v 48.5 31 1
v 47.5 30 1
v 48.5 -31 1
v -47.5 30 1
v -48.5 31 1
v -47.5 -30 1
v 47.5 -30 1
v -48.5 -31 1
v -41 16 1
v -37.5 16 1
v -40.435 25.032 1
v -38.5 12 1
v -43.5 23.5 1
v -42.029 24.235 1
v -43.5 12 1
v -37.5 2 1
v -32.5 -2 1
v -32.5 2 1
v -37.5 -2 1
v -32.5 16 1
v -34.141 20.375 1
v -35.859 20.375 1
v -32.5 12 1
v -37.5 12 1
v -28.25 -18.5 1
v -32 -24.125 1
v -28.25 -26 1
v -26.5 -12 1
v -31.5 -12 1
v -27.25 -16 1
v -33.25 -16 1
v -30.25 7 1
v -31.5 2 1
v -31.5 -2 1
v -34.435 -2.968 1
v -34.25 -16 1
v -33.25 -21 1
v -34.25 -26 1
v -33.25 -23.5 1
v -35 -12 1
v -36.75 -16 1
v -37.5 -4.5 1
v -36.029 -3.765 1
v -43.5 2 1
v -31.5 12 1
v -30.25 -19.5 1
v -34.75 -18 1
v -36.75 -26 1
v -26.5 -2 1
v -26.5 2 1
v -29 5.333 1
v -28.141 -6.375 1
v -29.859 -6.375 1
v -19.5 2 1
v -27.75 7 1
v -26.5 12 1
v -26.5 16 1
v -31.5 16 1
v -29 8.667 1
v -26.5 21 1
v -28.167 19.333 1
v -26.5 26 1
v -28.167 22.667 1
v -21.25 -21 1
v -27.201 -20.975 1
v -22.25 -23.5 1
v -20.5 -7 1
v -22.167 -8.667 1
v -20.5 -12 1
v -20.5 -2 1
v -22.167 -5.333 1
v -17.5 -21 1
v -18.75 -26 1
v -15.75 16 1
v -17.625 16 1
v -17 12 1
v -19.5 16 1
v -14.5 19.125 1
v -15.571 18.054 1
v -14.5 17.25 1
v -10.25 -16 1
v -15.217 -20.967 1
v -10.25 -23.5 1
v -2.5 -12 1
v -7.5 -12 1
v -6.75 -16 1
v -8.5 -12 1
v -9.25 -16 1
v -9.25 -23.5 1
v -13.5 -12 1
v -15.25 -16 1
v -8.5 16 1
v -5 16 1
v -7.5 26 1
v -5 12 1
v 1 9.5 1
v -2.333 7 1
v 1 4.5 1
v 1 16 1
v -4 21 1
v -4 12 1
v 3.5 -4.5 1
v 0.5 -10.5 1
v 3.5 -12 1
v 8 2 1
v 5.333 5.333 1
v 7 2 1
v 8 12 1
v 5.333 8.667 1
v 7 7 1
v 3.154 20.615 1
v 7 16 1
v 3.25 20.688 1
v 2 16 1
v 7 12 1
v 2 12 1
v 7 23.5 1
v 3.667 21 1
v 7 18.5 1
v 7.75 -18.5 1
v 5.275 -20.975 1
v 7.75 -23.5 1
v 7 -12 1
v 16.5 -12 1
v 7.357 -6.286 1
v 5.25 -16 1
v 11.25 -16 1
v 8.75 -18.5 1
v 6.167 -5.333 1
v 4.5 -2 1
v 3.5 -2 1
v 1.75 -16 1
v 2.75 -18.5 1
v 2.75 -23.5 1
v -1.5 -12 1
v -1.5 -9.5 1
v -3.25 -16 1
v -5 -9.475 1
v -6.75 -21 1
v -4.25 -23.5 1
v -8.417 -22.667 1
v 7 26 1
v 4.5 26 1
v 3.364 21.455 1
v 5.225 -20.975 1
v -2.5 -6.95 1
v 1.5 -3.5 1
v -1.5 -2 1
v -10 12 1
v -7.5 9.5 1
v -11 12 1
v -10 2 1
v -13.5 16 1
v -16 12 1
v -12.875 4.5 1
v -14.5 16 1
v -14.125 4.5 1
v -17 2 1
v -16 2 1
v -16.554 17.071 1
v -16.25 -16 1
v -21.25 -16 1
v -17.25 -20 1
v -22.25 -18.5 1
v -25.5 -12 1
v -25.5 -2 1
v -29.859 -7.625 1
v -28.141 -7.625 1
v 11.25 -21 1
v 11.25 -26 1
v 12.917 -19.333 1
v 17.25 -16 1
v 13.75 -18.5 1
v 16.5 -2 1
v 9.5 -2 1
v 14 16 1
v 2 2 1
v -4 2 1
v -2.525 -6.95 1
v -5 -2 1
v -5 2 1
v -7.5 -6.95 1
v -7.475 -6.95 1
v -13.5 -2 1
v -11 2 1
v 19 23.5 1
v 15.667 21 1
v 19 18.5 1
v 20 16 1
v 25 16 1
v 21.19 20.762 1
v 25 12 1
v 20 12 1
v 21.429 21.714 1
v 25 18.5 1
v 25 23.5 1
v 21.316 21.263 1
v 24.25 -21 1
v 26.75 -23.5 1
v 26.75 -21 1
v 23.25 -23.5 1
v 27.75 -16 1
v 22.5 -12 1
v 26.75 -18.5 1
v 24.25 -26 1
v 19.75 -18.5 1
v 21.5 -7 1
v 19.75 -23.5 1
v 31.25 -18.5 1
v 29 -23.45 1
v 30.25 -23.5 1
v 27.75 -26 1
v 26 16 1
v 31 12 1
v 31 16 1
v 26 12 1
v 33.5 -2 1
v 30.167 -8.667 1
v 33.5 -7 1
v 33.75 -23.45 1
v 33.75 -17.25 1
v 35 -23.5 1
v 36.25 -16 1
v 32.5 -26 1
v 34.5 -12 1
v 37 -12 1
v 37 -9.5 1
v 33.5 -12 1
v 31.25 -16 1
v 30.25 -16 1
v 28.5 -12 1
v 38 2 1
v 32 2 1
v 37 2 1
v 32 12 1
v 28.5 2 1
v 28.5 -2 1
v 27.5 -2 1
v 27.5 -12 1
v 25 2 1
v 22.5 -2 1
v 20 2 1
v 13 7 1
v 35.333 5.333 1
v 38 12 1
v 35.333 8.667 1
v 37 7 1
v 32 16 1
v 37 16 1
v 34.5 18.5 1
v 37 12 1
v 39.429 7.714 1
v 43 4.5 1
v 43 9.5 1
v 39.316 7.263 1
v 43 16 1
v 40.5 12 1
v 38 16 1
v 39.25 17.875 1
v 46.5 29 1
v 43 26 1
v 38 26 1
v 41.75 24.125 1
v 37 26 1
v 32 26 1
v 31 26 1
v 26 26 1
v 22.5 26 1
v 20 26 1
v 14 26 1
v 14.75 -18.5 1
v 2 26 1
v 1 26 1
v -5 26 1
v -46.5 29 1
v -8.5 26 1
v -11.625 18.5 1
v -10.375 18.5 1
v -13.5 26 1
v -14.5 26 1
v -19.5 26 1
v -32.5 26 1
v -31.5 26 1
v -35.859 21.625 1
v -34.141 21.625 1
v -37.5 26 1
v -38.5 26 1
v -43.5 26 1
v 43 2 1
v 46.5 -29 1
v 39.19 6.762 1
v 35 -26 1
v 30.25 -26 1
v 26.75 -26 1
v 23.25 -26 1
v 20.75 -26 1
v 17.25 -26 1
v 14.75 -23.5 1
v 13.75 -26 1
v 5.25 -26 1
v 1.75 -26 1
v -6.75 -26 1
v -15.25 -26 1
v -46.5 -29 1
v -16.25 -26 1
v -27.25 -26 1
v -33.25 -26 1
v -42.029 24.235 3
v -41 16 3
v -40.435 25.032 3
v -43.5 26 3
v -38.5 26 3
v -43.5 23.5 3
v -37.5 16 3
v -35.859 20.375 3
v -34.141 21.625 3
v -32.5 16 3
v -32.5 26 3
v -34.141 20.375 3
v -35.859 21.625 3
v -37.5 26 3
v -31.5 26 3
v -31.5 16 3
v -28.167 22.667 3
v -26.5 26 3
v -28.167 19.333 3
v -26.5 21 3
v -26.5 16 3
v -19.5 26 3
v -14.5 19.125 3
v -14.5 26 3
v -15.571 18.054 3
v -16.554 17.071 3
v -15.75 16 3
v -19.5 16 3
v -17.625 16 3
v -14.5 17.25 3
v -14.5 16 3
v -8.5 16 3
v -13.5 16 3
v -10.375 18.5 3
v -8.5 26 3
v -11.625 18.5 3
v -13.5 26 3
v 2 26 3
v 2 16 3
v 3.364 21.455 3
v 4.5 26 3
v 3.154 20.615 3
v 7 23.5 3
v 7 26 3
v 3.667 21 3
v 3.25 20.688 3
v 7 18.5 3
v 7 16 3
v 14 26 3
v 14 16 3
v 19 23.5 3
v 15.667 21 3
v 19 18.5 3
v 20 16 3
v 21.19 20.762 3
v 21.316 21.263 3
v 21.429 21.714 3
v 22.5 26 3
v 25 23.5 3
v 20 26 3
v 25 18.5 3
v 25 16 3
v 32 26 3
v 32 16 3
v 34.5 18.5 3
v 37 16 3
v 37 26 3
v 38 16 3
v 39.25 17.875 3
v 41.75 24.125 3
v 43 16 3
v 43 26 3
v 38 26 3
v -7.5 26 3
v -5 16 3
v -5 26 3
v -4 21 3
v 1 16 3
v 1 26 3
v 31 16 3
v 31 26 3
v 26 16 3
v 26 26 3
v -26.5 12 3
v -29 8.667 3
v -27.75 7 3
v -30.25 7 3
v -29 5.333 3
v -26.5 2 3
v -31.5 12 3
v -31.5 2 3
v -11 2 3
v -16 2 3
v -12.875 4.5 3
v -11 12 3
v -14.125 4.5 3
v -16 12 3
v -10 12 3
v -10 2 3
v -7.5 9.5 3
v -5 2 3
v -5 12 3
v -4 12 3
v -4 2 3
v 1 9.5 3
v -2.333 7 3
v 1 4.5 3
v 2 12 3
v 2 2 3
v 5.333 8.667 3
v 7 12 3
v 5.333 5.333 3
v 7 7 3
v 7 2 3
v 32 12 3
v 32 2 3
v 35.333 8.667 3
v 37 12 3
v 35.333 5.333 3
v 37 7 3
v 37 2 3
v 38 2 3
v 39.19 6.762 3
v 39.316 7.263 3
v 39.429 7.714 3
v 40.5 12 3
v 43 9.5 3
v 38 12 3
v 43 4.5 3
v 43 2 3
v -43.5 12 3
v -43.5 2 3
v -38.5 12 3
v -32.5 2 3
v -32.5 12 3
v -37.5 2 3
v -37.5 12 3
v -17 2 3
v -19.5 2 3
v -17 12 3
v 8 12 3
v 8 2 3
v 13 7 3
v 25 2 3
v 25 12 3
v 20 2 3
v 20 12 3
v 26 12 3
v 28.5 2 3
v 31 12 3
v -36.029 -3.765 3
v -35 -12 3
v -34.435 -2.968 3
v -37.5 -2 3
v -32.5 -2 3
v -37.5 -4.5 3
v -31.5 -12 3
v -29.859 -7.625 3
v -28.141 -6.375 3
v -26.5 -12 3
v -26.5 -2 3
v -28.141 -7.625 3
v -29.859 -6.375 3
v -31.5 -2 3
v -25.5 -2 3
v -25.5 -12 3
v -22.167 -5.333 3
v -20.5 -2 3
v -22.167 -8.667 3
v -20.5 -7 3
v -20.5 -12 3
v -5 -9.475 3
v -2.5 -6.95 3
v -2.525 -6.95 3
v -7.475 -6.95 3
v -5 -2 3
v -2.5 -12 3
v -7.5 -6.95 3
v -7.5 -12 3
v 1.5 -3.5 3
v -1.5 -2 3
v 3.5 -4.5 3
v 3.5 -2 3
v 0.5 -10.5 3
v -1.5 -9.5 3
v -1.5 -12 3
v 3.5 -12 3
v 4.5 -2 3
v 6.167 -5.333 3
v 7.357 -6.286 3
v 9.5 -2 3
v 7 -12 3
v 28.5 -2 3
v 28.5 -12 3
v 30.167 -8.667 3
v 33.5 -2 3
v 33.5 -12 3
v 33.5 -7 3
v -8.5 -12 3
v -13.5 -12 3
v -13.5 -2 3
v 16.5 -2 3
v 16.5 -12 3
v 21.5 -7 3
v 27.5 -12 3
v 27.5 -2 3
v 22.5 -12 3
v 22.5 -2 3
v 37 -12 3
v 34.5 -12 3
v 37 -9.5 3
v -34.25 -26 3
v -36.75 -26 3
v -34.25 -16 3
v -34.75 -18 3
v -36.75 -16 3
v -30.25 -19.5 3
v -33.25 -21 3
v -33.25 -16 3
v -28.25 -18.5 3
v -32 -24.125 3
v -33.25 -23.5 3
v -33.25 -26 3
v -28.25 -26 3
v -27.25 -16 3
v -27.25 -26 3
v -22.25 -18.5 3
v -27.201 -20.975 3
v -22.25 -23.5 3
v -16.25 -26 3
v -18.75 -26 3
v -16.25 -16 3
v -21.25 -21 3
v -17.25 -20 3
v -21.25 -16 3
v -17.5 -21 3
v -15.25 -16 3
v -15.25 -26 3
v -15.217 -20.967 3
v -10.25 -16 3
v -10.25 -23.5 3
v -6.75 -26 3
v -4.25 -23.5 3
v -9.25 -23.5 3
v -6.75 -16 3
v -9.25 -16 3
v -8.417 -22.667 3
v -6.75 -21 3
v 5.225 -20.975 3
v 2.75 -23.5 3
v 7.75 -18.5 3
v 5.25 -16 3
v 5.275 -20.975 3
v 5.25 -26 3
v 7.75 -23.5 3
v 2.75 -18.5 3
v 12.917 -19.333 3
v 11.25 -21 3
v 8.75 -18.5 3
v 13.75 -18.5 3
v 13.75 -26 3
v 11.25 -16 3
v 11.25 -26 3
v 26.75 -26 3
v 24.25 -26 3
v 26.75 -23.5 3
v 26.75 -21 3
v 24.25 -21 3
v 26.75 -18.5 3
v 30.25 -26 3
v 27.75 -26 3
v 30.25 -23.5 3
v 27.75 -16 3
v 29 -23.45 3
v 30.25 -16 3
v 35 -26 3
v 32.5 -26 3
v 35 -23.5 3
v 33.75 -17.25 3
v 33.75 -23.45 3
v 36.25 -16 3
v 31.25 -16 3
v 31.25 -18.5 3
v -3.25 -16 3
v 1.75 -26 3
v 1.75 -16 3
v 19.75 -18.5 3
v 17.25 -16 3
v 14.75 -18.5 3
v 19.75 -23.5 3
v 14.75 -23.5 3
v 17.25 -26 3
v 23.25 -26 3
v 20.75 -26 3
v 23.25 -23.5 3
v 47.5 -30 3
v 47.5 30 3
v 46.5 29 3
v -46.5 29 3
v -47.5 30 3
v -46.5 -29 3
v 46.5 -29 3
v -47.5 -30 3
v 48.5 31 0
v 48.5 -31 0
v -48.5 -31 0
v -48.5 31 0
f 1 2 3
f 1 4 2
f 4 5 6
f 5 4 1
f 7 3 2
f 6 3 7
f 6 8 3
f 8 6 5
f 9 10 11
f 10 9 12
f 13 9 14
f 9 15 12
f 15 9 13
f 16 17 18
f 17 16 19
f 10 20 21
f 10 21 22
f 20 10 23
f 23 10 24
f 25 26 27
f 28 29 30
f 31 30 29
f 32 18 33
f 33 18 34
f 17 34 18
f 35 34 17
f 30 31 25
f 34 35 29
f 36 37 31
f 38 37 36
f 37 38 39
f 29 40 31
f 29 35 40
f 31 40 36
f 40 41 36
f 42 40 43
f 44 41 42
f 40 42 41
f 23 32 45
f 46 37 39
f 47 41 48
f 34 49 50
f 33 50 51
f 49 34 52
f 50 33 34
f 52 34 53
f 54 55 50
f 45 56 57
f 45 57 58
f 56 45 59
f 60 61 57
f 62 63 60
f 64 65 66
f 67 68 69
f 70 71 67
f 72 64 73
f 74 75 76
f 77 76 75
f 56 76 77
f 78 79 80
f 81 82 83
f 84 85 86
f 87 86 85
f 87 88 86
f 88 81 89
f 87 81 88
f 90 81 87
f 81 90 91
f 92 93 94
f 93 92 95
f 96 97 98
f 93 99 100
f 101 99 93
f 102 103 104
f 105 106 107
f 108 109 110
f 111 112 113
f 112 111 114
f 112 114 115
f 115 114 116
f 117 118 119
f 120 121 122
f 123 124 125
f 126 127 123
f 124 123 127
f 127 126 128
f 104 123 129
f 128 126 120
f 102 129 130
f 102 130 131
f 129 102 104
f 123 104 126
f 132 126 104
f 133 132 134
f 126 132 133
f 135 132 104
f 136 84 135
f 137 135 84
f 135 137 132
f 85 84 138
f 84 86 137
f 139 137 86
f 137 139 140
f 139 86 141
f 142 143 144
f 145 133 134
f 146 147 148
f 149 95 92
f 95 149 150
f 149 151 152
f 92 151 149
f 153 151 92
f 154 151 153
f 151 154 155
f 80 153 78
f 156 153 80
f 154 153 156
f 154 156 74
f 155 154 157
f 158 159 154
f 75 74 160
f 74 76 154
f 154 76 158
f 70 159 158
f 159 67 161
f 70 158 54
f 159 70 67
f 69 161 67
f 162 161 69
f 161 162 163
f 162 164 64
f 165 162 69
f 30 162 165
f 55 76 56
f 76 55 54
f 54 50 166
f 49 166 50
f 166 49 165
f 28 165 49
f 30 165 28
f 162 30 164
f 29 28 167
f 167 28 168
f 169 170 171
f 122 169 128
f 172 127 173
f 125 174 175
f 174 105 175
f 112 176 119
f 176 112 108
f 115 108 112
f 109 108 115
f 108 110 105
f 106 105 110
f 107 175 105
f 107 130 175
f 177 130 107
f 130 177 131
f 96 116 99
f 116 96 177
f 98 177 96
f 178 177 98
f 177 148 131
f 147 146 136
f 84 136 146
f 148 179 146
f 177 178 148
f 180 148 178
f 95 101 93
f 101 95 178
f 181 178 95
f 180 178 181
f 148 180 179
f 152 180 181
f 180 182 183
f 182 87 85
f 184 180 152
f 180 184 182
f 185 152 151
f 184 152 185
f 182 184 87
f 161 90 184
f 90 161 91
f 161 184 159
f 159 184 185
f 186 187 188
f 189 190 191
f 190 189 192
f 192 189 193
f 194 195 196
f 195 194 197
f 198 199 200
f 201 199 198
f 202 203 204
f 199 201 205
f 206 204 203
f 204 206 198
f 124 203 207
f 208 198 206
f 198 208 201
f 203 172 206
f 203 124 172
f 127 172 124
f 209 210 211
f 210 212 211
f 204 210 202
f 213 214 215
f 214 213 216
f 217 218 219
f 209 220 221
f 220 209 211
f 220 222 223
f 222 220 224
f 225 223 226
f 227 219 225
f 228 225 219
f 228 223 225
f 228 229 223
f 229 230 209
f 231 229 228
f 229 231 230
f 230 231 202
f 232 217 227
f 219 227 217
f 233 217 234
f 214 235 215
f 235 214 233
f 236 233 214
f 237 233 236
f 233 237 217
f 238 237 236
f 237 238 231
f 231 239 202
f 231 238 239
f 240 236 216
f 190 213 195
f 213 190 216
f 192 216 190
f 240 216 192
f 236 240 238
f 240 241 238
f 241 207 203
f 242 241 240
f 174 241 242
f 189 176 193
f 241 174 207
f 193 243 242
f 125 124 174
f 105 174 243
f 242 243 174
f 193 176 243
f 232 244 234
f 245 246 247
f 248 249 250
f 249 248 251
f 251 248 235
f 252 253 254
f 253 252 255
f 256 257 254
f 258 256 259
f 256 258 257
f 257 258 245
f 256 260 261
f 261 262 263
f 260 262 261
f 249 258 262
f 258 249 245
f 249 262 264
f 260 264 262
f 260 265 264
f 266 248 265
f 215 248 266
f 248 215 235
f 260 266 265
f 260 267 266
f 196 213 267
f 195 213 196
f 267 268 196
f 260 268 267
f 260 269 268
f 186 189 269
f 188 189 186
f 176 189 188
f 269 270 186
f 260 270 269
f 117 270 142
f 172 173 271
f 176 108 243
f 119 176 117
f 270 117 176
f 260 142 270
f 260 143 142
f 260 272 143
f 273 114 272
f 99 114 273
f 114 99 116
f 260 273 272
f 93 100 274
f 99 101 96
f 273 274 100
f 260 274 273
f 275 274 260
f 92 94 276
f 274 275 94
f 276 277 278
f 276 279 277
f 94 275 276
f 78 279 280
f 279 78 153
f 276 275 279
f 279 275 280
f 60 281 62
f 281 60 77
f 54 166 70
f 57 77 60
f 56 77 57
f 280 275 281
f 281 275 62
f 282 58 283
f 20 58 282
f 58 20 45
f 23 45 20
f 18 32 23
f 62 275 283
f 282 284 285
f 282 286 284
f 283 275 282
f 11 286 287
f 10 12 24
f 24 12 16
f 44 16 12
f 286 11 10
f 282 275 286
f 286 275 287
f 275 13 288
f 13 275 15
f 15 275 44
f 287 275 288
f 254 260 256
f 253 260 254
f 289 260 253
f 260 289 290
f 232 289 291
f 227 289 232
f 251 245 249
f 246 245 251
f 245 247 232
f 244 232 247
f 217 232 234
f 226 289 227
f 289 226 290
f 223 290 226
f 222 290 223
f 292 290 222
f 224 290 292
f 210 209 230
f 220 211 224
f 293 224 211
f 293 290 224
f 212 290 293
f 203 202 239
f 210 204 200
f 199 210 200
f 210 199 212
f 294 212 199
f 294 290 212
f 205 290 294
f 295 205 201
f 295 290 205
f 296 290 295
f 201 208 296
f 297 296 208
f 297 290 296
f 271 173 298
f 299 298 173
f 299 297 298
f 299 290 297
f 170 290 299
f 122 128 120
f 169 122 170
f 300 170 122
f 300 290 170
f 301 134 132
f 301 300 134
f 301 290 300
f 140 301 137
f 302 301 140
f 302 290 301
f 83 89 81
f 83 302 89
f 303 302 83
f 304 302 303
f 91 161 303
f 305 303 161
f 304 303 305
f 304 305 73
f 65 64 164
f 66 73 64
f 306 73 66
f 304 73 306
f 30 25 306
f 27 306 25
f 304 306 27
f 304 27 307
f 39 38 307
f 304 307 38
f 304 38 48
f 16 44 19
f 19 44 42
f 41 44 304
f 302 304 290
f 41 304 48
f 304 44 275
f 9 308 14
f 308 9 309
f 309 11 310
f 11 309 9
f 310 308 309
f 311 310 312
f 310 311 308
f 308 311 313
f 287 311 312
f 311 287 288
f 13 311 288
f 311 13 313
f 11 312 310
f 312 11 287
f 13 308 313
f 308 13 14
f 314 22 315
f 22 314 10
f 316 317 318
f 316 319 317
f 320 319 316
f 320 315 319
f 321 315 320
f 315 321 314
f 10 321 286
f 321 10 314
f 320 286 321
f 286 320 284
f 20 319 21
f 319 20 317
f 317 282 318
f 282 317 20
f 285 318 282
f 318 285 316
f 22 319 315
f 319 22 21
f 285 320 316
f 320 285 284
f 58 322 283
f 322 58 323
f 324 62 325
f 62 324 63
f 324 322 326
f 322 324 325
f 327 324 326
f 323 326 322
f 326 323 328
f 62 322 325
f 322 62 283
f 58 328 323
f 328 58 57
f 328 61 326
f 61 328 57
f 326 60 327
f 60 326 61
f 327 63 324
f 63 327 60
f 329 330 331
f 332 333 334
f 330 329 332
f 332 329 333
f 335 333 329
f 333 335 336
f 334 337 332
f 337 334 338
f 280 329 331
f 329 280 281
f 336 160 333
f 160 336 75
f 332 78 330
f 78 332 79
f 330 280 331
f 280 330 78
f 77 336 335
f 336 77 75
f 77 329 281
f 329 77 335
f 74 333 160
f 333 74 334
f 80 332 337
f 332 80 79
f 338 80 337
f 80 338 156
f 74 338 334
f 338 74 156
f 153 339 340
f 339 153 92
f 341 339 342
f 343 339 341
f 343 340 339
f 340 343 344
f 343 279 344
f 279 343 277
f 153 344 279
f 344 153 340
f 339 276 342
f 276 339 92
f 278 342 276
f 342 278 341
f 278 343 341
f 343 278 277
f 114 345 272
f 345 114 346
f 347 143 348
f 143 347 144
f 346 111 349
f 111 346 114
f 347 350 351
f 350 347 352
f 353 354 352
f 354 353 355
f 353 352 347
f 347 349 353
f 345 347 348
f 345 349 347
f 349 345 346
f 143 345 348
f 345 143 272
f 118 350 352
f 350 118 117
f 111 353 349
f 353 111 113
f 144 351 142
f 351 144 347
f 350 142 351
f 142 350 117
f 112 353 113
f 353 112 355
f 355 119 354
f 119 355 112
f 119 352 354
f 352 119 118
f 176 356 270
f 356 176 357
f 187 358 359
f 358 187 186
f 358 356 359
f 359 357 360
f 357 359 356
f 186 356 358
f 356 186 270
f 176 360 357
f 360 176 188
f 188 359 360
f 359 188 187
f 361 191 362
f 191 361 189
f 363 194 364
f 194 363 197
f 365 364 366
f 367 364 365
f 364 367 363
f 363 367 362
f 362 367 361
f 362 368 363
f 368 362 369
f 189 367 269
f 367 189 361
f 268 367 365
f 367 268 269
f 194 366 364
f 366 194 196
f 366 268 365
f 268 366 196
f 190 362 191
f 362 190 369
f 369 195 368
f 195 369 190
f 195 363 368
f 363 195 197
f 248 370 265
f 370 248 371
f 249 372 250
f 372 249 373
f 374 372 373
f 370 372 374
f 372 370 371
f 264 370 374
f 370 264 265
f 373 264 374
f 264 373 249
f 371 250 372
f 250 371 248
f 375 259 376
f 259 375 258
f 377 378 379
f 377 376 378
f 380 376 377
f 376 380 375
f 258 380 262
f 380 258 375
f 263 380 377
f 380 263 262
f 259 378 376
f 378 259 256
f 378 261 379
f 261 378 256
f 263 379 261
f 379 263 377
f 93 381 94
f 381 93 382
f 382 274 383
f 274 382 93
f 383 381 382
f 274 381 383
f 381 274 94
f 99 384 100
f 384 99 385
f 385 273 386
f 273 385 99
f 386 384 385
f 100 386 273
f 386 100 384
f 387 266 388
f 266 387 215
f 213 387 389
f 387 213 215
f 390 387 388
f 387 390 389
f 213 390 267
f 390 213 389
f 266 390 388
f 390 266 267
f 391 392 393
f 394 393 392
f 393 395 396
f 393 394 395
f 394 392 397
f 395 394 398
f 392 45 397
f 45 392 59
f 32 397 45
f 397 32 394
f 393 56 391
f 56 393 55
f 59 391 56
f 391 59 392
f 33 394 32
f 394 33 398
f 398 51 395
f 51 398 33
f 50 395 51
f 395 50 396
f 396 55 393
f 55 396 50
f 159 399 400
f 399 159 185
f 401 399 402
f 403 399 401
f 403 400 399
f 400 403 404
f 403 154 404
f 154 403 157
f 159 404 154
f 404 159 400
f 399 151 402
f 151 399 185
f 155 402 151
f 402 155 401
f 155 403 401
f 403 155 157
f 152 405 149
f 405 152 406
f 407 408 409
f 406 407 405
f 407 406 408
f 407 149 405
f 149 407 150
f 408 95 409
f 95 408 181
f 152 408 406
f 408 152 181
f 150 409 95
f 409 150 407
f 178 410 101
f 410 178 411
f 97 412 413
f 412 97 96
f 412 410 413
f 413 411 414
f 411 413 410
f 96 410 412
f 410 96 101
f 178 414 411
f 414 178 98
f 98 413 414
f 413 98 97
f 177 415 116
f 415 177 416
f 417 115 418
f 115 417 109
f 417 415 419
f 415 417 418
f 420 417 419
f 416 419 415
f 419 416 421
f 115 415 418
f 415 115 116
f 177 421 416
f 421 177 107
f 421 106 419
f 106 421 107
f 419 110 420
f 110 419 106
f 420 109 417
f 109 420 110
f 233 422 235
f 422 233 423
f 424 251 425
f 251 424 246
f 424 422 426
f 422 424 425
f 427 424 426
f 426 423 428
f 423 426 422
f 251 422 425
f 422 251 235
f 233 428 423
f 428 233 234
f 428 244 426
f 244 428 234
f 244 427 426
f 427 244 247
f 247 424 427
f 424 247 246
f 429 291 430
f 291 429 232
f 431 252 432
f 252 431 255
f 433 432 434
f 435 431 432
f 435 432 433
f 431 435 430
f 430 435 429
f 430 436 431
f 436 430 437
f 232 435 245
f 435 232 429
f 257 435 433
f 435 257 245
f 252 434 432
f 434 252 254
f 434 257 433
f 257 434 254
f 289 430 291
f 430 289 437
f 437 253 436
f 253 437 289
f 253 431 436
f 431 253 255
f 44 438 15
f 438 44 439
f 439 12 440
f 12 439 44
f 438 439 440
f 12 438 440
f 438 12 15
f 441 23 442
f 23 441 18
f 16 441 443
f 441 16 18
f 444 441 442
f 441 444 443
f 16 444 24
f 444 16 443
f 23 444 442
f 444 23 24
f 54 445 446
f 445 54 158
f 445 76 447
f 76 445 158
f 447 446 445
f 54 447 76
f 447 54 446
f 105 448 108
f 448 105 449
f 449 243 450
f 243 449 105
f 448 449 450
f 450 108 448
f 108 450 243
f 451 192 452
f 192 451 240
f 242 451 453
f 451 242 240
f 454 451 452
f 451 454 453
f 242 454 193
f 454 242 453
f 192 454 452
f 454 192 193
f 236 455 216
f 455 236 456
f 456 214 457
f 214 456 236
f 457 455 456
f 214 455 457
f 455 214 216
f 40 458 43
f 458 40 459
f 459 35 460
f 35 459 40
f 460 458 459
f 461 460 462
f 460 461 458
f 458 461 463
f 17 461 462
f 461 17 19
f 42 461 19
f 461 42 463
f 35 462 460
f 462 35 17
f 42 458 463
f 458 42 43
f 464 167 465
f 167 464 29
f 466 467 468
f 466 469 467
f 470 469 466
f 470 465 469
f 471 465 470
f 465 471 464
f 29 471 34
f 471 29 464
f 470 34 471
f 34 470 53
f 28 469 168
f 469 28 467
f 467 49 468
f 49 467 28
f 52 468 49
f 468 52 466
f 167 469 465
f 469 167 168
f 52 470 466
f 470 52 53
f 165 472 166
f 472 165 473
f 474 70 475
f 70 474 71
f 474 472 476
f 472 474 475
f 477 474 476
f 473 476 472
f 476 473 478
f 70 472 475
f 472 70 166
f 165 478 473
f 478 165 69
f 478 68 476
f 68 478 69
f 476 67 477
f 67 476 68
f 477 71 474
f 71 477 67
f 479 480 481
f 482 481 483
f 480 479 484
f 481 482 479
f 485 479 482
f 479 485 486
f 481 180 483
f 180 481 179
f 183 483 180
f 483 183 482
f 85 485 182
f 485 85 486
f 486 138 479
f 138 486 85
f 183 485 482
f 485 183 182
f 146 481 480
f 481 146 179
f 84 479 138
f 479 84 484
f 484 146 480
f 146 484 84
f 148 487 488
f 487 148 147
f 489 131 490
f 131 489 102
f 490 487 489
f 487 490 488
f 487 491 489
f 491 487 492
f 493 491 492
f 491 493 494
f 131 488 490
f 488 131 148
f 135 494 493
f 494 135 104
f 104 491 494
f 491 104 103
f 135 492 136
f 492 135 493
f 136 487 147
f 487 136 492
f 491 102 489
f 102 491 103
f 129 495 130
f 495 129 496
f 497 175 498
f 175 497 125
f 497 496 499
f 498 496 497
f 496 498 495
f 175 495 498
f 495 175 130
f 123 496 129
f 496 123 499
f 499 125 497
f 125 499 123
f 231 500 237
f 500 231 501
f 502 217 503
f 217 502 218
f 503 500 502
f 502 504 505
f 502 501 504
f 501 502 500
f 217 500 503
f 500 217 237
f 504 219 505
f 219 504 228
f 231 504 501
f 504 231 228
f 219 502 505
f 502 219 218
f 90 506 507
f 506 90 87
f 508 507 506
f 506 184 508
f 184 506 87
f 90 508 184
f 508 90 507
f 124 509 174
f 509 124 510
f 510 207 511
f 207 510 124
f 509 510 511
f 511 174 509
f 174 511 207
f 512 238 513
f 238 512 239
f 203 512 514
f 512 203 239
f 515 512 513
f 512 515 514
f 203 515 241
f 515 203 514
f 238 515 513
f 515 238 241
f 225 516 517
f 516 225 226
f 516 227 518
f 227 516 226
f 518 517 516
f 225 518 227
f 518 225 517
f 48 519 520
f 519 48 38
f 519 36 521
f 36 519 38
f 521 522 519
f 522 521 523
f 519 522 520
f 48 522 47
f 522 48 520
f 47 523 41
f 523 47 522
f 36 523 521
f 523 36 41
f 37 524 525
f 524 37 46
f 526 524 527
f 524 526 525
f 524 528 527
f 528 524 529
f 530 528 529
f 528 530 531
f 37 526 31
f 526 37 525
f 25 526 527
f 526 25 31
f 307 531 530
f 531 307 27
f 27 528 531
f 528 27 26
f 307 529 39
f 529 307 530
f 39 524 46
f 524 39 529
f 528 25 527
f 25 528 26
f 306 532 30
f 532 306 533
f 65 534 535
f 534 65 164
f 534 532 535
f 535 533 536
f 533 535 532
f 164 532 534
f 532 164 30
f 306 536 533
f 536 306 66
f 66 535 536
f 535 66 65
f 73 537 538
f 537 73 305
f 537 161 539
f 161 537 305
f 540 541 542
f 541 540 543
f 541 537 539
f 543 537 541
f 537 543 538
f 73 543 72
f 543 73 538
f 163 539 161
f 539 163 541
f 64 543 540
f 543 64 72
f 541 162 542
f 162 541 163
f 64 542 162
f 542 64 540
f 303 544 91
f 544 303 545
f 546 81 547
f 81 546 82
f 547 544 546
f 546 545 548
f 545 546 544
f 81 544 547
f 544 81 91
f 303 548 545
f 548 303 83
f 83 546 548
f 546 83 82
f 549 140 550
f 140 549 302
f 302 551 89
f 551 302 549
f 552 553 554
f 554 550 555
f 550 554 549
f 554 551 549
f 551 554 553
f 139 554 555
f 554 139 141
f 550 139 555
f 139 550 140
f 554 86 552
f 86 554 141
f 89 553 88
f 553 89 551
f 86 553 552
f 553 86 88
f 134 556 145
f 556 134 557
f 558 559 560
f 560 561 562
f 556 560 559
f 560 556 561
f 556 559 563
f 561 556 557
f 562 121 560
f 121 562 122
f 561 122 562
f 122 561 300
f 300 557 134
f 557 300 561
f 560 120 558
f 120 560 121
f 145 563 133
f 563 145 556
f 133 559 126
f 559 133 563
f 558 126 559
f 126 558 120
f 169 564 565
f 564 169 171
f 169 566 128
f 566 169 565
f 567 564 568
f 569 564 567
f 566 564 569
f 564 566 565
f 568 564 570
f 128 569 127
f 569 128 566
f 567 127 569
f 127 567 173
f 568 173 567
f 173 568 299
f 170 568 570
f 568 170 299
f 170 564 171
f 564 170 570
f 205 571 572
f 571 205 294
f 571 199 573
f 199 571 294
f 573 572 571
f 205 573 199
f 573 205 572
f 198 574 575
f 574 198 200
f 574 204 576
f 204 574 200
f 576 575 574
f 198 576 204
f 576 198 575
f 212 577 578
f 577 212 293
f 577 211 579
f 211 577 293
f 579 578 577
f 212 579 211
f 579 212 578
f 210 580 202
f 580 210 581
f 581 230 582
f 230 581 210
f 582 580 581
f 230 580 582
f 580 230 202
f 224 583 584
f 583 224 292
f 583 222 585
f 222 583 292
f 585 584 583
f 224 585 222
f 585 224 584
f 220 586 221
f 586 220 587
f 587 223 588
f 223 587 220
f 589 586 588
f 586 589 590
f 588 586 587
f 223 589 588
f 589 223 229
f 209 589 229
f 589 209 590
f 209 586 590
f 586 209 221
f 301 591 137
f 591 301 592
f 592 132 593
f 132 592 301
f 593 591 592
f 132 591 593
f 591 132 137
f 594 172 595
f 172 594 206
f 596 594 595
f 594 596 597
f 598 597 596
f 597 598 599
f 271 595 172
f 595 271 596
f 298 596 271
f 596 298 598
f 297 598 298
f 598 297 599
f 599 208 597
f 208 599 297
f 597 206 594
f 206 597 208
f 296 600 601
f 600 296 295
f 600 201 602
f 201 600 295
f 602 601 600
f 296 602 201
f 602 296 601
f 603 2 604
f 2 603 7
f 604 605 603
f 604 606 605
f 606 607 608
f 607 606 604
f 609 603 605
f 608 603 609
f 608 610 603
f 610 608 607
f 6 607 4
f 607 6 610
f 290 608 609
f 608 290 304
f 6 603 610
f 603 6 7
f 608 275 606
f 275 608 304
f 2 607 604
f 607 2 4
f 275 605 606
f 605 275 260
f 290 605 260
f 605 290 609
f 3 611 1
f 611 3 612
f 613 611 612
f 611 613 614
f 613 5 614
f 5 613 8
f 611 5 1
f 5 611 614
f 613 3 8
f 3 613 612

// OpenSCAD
// lowpolyfont v1_0
// GPLv2
// (c) 2013 TakeItAndRun
//
// v1_1: 
//

/*





*/
//*******************************************************
//
// Low polygon count font
//
//*******************************************************



//*******************************************************
//
// basic definitions
//
//*******************************************************


// small displacement to avoid parallel faces with zero volume
e=+0.02;

// unit vectors
xaxis=+[1,0,0];
yaxis=+[0,1,0];
zaxis=+[0,0,1];

//*******************************************************
//
// dimensions
//
//*******************************************************

/* [text] */

//number of lines
nl=4;//[1:4]

// Text (ONLY CAPITALS!)
text1="THE QUICK BROWN";
text2="FOX JUMBED OVER";
text3="THE LAZY DOG.";
text4="1234567890.:!?";



/* [type] */

//thickness of type
t=2;//[.1:10]

//height of type
h=10;//[1:50]

//width of type
w=5;//[1:50]

//spacing between letters
d=1;//[0.0:5.0]
dpos=d;

//conical shape
//pq=40;//[0:100]
//q=pq/100;

// spacing between lines
dl=4;//[0.0:10:0]

/* [sign] */

// sign
sign=!false;//[false:none,true:sign]
//length past type
dsx=3;//[0:10]
//height above type
dsy=3;//[0:10]
//thickness of the sign
sz=1;//[1:10]
// edge
edge=!false;//[false:none,true:sign]
// width of edge
we=1;//[0.1:10.0]


/* [Hidden] */

text=["",text1,text2,text3,text4];


//*******************************************************
//
// polygons of the letters:
//	Every letter is one element of the array fo:
// the first number is the width of the letter
//	then follows a list of polygons
//
//	the key to the (order of the) letters is the string str0
//
//*******************************************************

str0=" ABCDEFGHIJKLMNOPQRSTUVWXYZ1234567890.:!?";

fo=
[
[
// space
2,
[],

],[
//A
2,
[[0,2],[1,4],[2,2]],
[[0,2+e],[2,2+e],[0,0]],
[[0,2+e],[2,2+e],[2,0]],
],[
//B
2,
[[0,4],[2,3],[0,1.5]],
[[0,2.5],[2,1],[0,0]],
],[
//C
2,
[[0,2],[2,4],[2,0]],
],[
//D
2,
[[0,4],[2,2],[0,0]],
],[
//E
2,
[[0,4],[2,4],[0,0]],
[[0,4],[2,0],[0,0]],
[[0,4],[2,2],[0,0]],
],[
//F
2,
[[0,4],[2,4],[0,0]],
],[
//G
2,
[[0,4],[2,4],[0,0]],
[[0,1],[2,2],[2,0],[0,0]],
],[
//H
2,
[[0,4],[.75,2],[0,0]],
[[1.25,2],[2,4],[2,0]],
[[0,2.25],[2,2.25],[2,1.75],[0,1.75]],
],[
//I
1,
[[0,4],[1,4],[1,0]],
],[
//J
1,
[[1,4],[1,0],[0,0]],
],[
//K
2,
[[0,4],[1,4],[0,0]],
[[0,1.5],[2,4],[2,3]],
[[0,2.5],[2,1],[2,0]],
],[
//L
2,
[[0,4],[2,0],[0,0]],
],[
//M
2,
[[0,4],[2,2],[2,0],[0,0]],
[[2,4],[2,0],[0,0],[0,2]],
],[
//N
2,
[[0,4],[2,3],[0,0]],
[[0,1],[2,4],[2,0]],
],[
//O
2,
[[0,4],[2,4],[2,0],[0,0]],
],[
//P
2,
[[1,4],[2,3],[0,2]],
[[0,4],[1,4],[0,0]],
],[
//Q
2,
[[0,4],[2,4],[2,1.25],[.75,0],[0,0]],
[[0,2],[2,.5],[2,0],[1.5,0]],
//[[1.5,1],[2,0],[1,.5]],
],[
//R
2,
[[0,4],[1,4],[0,0]],
[[0,2],[1,4],[2,3]],
[[0,2.5],[2,1],[2,0]],
],[
//S
2,
[[2,4],[2,1.5],[0,3]],
[[0,2.5],[2,1],[0,0]],
],[
//T
2,
[[0.5,4],[1.25,4],[1,0]],
[[0,4],[2,4],[0,3]],
],[
//U
2,
[[0,4],[1,0],[0,0]],
[[2,4],[2,0],[1,0]],
[[0,0],[0,1],[2,1],[2,0]],
],[
//V
2,
[[0,4],[2,4],[1,0]],
],[
//W
2,
[[0,4],[2,4],[2,0],[0,2]],
[[0,4],[2,4],[2,2],[0,0]],
],[
//X
2,
[[0,4],[1.5,2],[.5,2]],
[[2,4],[1.5,2],[.5,2]],
[[0,0],[.5,2],[1.5,2]],
[[2,0],[.5,2],[1.5,2]],
],[
//Y
2,
[[0,4],[2,4],[1,2]],
[[0.5,4],[1.25,4],[1,0]],
],[
//Z
2,
[[0,4],[2,4],[2,3]],
[[0,0],[0,1],[2,0]],
[[0,1],[1.5,4],[2,3],[.5,0]],
],[
//1
1,
[[0,0],[1,4],[1,0]],
[[0,4],[1,4],[1,3]],
],[
//2
2,
[[0,4],[2,3],[0,2]],
[[0,0],[0,1],[2,0]],
[[0,1],[1.5,3],[2,3],[0,0]],
],[
//3
2,
[[0,4],[2,3],[0,2]],
[[0,0],[0,2+e],[2,1]],
],[
//4
2,
[[1,0],[2,4],[2,0]],
[[0,4],[2,2],[0,2]],
],[
//5
2,
[[0,4],[2,4],[0,2]],
[[0,0],[0,2+e],[2,1]],
],[
//6
2,
[[1,0],[0,1],[1,2],[2,1]],
[[0,4],[1,4],[.25,1],[0,1]],
],[
//7
2,
//[[0,4],[2,4],[2,3.5],[0,3]],
//[[0,4],[1,4],[.25,1],[0,1]],
[[0,4],[2,4],[2,0]],
],[
//8
2,
[[1,0],[0,1],[1,2+e],[2,1]],
[[1,4],[2,3],[1,2],[0,3]],
],[
//9
2,
[[1,4],[2,3],[1,2],[0,3]],
[[1,0],[1.75,3],[2,3],[2,0]],
],[
//0
2,
[[1,0],[0,1],[0,3],[1,4],[2,3],[2,1]],
],[
//.
1,
[[0,0],[1,1],[1,0]],
],[
//:
1,
[[0,0],[1,1],[1,0]],
[[0,2],[1,3],[1,2]],
],[
//!
1,
[[0,0],[1,1],[1,0]],
[[0,4],[1,4],[.5,1+e]],
],[
//?
2,
[[0.5,0],[1.5,1],[1.5,0]],
[[1,4],[2,4],[1,1+e]],
[[0,4],[2,4],[0,3]],
],[

]
];


//*******************************************************
//
// routines
//
//*******************************************************

// make the i-th letter in the string str0
module letter(s){
	for(i=[1:len(fo[s])-1]){
// comment out the line with linear_extrude to get a 2-dim output for a dxf export
	linear_extrude(height=t)
		scale([w/2,h/4])polygon(fo[s][i]);
	}
}

// print one line of text 
// str: text to be printed (use only letters that are included in the string str0 (capital letters, numbers, some special characters)
module type(str,center=false){
	translate([(center)?-(pos(len(str),str)-dpos/2)/2:0,(center)?-h/2:0,0])
	for(i=[0:len(str)-1]){
		translate(pos(i,str)*xaxis)
		letter(index(str[i],str0));
	}
}


module sign(){
// calculate x,y-dimensions of the sign
	ssx=maximum(nl)+2*dsx+((edge)?4*we:0);
	ssy=nl*h+(nl-1)*dl+2*dsy+((edge)?4*we:0);

	color("yellow")
	translate((nl-1)*(h+dl)/2*yaxis+((sign)?sz:0)*zaxis)
	for (i=[1:nl]){
		translate(-(i-1)*(h+dl)*yaxis)
			type(text[i],true);
	}
	if (sign){
		color("blue")
		translate(sz/2*zaxis)
			cube([ssx,ssy,sz],true);
		color("yellow")
		translate((sz+t/2)*zaxis)
			for(m=[-1,1]){
				translate(m*(ssy-3*we)/2*yaxis)
					cube([ssx-2*we,we,t],true);
				translate(m*(ssx-3*we)/2*xaxis)
					cube([we,ssy-2*we,t],true);
			}
	}
}



// get the length of the longest line
function maximum(nl,i=1)=(i<nl)?
	max((pos(len(text[i]),text[i])-dpos/2),maximum(nl,i+1)):
	(pos(len(text[i]),text[i])-dpos/2)
;

// return index of a letter in the fo vector / string str0
function index(str)=
	search(str,str0)[0];


// Calculate the position of the i-th letter as sum of the
// width plus spacing of all the letters before it.
// This function looks so witty because OpenSCAD does not
// allow re-assignment of variables during run time.
// The idea for this function (somewhat simplified) I took from
// http://www.thingiverse.com/thing:22730
// by Bernhard -HotKey- Slawik, http://www.bernhardslawik.de
// This function is defined only for 80 characters. You may 
// expand it if you need more than 80 characters per line.
function pos(i,str)=
	w/2*(
	(i==0)?0:i*dpos*2/w
	+((i>=1)?fo[index(str[0])][0]:0)
	+((i>=2)?fo[index(str[1])][0]:0)
	+((i>=3)?fo[index(str[2])][0]:0)
	+((i>=4)?fo[index(str[3])][0]:0)
	+((i>=5)?fo[index(str[4])][0]:0)
	+((i>=6)?fo[index(str[5])][0]:0)
	+((i>=7)?fo[index(str[6])][0]:0)
	+((i>=8)?fo[index(str[7])][0]:0)
	+((i>=9)?fo[index(str[8])][0]:0)
	+((i>=10)?fo[index(str[9])][0]:0)
	+((i>=11)?fo[index(str[10])][0]:0)
	+((i>=12)?fo[index(str[11])][0]:0)
	+((i>=13)?fo[index(str[12])][0]:0)
	+((i>=14)?fo[index(str[13])][0]:0)
	+((i>=15)?fo[index(str[14])][0]:0)
	+((i>=16)?fo[index(str[15])][0]:0)
	+((i>=17)?fo[index(str[16])][0]:0)
	+((i>=18)?fo[index(str[17])][0]:0)
	+((i>=19)?fo[index(str[18])][0]:0)
	+((i>=20)?fo[index(str[19])][0]:0)
	+((i>=21)?fo[index(str[20])][0]:0)
	+((i>=22)?fo[index(str[21])][0]:0)
	+((i>=23)?fo[index(str[22])][0]:0)
	+((i>=24)?fo[index(str[23])][0]:0)
	+((i>=25)?fo[index(str[24])][0]:0)
	+((i>=26)?fo[index(str[25])][0]:0)
	+((i>=27)?fo[index(str[26])][0]:0)
	+((i>=28)?fo[index(str[27])][0]:0)
	+((i>=29)?fo[index(str[28])][0]:0)
	+((i>=30)?fo[index(str[29])][0]:0)
	+((i>=31)?fo[index(str[30])][0]:0)
	+((i>=32)?fo[index(str[31])][0]:0)
	+((i>=33)?fo[index(str[32])][0]:0)
	+((i>=34)?fo[index(str[33])][0]:0)
	+((i>=35)?fo[index(str[34])][0]:0)
	+((i>=36)?fo[index(str[35])][0]:0)
	+((i>=37)?fo[index(str[36])][0]:0)
	+((i>=38)?fo[index(str[37])][0]:0)
	+((i>=39)?fo[index(str[38])][0]:0)
	+((i>=40)?fo[index(str[39])][0]:0)
	+((i>=41)?fo[index(str[40])][0]:0)
	+((i>=42)?fo[index(str[41])][0]:0)
	+((i>=43)?fo[index(str[42])][0]:0)
	+((i>=44)?fo[index(str[43])][0]:0)
	+((i>=45)?fo[index(str[44])][0]:0)
	+((i>=46)?fo[index(str[45])][0]:0)
	+((i>=47)?fo[index(str[46])][0]:0)
	+((i>=48)?fo[index(str[47])][0]:0)
	+((i>=49)?fo[index(str[48])][0]:0)
	+((i>=50)?fo[index(str[49])][0]:0)
	+((i>=51)?fo[index(str[50])][0]:0)
	+((i>=52)?fo[index(str[51])][0]:0)
	+((i>=53)?fo[index(str[52])][0]:0)
	+((i>=54)?fo[index(str[53])][0]:0)
	+((i>=55)?fo[index(str[54])][0]:0)
	+((i>=56)?fo[index(str[55])][0]:0)
	+((i>=57)?fo[index(str[56])][0]:0)
	+((i>=58)?fo[index(str[57])][0]:0)
	+((i>=59)?fo[index(str[58])][0]:0)
	+((i>=60)?fo[index(str[59])][0]:0)
	+((i>=61)?fo[index(str[60])][0]:0)
	+((i>=62)?fo[index(str[61])][0]:0)
	+((i>=63)?fo[index(str[62])][0]:0)
	+((i>=64)?fo[index(str[63])][0]:0)
	+((i>=65)?fo[index(str[64])][0]:0)
	+((i>=66)?fo[index(str[65])][0]:0)
	+((i>=67)?fo[index(str[66])][0]:0)
	+((i>=68)?fo[index(str[67])][0]:0)
	+((i>=69)?fo[index(str[68])][0]:0)
	+((i>=70)?fo[index(str[69])][0]:0)
	+((i>=71)?fo[index(str[70])][0]:0)
	+((i>=72)?fo[index(str[71])][0]:0)
	+((i>=73)?fo[index(str[72])][0]:0)
	+((i>=74)?fo[index(str[73])][0]:0)
	+((i>=75)?fo[index(str[74])][0]:0)
	+((i>=76)?fo[index(str[75])][0]:0)
	+((i>=77)?fo[index(str[76])][0]:0)
	+((i>=78)?fo[index(str[77])][0]:0)
	+((i>=79)?fo[index(str[78])][0]:0)
	+((i>=80)?fo[index(str[79])][0]:0)
	)
//	+((i>=4)?fo[index(str[4])][0]:0)

;


//*******************************************************
//
// main program
//
//*******************************************************



// one line of text
//str="THE QUICK BROWN FOX JUMBED OVER THE LAZY DOG.";
//str=str0;
//type(str,!true);

// sign with up to 4 lines of text (if sign=true, else just the text)
sign();
